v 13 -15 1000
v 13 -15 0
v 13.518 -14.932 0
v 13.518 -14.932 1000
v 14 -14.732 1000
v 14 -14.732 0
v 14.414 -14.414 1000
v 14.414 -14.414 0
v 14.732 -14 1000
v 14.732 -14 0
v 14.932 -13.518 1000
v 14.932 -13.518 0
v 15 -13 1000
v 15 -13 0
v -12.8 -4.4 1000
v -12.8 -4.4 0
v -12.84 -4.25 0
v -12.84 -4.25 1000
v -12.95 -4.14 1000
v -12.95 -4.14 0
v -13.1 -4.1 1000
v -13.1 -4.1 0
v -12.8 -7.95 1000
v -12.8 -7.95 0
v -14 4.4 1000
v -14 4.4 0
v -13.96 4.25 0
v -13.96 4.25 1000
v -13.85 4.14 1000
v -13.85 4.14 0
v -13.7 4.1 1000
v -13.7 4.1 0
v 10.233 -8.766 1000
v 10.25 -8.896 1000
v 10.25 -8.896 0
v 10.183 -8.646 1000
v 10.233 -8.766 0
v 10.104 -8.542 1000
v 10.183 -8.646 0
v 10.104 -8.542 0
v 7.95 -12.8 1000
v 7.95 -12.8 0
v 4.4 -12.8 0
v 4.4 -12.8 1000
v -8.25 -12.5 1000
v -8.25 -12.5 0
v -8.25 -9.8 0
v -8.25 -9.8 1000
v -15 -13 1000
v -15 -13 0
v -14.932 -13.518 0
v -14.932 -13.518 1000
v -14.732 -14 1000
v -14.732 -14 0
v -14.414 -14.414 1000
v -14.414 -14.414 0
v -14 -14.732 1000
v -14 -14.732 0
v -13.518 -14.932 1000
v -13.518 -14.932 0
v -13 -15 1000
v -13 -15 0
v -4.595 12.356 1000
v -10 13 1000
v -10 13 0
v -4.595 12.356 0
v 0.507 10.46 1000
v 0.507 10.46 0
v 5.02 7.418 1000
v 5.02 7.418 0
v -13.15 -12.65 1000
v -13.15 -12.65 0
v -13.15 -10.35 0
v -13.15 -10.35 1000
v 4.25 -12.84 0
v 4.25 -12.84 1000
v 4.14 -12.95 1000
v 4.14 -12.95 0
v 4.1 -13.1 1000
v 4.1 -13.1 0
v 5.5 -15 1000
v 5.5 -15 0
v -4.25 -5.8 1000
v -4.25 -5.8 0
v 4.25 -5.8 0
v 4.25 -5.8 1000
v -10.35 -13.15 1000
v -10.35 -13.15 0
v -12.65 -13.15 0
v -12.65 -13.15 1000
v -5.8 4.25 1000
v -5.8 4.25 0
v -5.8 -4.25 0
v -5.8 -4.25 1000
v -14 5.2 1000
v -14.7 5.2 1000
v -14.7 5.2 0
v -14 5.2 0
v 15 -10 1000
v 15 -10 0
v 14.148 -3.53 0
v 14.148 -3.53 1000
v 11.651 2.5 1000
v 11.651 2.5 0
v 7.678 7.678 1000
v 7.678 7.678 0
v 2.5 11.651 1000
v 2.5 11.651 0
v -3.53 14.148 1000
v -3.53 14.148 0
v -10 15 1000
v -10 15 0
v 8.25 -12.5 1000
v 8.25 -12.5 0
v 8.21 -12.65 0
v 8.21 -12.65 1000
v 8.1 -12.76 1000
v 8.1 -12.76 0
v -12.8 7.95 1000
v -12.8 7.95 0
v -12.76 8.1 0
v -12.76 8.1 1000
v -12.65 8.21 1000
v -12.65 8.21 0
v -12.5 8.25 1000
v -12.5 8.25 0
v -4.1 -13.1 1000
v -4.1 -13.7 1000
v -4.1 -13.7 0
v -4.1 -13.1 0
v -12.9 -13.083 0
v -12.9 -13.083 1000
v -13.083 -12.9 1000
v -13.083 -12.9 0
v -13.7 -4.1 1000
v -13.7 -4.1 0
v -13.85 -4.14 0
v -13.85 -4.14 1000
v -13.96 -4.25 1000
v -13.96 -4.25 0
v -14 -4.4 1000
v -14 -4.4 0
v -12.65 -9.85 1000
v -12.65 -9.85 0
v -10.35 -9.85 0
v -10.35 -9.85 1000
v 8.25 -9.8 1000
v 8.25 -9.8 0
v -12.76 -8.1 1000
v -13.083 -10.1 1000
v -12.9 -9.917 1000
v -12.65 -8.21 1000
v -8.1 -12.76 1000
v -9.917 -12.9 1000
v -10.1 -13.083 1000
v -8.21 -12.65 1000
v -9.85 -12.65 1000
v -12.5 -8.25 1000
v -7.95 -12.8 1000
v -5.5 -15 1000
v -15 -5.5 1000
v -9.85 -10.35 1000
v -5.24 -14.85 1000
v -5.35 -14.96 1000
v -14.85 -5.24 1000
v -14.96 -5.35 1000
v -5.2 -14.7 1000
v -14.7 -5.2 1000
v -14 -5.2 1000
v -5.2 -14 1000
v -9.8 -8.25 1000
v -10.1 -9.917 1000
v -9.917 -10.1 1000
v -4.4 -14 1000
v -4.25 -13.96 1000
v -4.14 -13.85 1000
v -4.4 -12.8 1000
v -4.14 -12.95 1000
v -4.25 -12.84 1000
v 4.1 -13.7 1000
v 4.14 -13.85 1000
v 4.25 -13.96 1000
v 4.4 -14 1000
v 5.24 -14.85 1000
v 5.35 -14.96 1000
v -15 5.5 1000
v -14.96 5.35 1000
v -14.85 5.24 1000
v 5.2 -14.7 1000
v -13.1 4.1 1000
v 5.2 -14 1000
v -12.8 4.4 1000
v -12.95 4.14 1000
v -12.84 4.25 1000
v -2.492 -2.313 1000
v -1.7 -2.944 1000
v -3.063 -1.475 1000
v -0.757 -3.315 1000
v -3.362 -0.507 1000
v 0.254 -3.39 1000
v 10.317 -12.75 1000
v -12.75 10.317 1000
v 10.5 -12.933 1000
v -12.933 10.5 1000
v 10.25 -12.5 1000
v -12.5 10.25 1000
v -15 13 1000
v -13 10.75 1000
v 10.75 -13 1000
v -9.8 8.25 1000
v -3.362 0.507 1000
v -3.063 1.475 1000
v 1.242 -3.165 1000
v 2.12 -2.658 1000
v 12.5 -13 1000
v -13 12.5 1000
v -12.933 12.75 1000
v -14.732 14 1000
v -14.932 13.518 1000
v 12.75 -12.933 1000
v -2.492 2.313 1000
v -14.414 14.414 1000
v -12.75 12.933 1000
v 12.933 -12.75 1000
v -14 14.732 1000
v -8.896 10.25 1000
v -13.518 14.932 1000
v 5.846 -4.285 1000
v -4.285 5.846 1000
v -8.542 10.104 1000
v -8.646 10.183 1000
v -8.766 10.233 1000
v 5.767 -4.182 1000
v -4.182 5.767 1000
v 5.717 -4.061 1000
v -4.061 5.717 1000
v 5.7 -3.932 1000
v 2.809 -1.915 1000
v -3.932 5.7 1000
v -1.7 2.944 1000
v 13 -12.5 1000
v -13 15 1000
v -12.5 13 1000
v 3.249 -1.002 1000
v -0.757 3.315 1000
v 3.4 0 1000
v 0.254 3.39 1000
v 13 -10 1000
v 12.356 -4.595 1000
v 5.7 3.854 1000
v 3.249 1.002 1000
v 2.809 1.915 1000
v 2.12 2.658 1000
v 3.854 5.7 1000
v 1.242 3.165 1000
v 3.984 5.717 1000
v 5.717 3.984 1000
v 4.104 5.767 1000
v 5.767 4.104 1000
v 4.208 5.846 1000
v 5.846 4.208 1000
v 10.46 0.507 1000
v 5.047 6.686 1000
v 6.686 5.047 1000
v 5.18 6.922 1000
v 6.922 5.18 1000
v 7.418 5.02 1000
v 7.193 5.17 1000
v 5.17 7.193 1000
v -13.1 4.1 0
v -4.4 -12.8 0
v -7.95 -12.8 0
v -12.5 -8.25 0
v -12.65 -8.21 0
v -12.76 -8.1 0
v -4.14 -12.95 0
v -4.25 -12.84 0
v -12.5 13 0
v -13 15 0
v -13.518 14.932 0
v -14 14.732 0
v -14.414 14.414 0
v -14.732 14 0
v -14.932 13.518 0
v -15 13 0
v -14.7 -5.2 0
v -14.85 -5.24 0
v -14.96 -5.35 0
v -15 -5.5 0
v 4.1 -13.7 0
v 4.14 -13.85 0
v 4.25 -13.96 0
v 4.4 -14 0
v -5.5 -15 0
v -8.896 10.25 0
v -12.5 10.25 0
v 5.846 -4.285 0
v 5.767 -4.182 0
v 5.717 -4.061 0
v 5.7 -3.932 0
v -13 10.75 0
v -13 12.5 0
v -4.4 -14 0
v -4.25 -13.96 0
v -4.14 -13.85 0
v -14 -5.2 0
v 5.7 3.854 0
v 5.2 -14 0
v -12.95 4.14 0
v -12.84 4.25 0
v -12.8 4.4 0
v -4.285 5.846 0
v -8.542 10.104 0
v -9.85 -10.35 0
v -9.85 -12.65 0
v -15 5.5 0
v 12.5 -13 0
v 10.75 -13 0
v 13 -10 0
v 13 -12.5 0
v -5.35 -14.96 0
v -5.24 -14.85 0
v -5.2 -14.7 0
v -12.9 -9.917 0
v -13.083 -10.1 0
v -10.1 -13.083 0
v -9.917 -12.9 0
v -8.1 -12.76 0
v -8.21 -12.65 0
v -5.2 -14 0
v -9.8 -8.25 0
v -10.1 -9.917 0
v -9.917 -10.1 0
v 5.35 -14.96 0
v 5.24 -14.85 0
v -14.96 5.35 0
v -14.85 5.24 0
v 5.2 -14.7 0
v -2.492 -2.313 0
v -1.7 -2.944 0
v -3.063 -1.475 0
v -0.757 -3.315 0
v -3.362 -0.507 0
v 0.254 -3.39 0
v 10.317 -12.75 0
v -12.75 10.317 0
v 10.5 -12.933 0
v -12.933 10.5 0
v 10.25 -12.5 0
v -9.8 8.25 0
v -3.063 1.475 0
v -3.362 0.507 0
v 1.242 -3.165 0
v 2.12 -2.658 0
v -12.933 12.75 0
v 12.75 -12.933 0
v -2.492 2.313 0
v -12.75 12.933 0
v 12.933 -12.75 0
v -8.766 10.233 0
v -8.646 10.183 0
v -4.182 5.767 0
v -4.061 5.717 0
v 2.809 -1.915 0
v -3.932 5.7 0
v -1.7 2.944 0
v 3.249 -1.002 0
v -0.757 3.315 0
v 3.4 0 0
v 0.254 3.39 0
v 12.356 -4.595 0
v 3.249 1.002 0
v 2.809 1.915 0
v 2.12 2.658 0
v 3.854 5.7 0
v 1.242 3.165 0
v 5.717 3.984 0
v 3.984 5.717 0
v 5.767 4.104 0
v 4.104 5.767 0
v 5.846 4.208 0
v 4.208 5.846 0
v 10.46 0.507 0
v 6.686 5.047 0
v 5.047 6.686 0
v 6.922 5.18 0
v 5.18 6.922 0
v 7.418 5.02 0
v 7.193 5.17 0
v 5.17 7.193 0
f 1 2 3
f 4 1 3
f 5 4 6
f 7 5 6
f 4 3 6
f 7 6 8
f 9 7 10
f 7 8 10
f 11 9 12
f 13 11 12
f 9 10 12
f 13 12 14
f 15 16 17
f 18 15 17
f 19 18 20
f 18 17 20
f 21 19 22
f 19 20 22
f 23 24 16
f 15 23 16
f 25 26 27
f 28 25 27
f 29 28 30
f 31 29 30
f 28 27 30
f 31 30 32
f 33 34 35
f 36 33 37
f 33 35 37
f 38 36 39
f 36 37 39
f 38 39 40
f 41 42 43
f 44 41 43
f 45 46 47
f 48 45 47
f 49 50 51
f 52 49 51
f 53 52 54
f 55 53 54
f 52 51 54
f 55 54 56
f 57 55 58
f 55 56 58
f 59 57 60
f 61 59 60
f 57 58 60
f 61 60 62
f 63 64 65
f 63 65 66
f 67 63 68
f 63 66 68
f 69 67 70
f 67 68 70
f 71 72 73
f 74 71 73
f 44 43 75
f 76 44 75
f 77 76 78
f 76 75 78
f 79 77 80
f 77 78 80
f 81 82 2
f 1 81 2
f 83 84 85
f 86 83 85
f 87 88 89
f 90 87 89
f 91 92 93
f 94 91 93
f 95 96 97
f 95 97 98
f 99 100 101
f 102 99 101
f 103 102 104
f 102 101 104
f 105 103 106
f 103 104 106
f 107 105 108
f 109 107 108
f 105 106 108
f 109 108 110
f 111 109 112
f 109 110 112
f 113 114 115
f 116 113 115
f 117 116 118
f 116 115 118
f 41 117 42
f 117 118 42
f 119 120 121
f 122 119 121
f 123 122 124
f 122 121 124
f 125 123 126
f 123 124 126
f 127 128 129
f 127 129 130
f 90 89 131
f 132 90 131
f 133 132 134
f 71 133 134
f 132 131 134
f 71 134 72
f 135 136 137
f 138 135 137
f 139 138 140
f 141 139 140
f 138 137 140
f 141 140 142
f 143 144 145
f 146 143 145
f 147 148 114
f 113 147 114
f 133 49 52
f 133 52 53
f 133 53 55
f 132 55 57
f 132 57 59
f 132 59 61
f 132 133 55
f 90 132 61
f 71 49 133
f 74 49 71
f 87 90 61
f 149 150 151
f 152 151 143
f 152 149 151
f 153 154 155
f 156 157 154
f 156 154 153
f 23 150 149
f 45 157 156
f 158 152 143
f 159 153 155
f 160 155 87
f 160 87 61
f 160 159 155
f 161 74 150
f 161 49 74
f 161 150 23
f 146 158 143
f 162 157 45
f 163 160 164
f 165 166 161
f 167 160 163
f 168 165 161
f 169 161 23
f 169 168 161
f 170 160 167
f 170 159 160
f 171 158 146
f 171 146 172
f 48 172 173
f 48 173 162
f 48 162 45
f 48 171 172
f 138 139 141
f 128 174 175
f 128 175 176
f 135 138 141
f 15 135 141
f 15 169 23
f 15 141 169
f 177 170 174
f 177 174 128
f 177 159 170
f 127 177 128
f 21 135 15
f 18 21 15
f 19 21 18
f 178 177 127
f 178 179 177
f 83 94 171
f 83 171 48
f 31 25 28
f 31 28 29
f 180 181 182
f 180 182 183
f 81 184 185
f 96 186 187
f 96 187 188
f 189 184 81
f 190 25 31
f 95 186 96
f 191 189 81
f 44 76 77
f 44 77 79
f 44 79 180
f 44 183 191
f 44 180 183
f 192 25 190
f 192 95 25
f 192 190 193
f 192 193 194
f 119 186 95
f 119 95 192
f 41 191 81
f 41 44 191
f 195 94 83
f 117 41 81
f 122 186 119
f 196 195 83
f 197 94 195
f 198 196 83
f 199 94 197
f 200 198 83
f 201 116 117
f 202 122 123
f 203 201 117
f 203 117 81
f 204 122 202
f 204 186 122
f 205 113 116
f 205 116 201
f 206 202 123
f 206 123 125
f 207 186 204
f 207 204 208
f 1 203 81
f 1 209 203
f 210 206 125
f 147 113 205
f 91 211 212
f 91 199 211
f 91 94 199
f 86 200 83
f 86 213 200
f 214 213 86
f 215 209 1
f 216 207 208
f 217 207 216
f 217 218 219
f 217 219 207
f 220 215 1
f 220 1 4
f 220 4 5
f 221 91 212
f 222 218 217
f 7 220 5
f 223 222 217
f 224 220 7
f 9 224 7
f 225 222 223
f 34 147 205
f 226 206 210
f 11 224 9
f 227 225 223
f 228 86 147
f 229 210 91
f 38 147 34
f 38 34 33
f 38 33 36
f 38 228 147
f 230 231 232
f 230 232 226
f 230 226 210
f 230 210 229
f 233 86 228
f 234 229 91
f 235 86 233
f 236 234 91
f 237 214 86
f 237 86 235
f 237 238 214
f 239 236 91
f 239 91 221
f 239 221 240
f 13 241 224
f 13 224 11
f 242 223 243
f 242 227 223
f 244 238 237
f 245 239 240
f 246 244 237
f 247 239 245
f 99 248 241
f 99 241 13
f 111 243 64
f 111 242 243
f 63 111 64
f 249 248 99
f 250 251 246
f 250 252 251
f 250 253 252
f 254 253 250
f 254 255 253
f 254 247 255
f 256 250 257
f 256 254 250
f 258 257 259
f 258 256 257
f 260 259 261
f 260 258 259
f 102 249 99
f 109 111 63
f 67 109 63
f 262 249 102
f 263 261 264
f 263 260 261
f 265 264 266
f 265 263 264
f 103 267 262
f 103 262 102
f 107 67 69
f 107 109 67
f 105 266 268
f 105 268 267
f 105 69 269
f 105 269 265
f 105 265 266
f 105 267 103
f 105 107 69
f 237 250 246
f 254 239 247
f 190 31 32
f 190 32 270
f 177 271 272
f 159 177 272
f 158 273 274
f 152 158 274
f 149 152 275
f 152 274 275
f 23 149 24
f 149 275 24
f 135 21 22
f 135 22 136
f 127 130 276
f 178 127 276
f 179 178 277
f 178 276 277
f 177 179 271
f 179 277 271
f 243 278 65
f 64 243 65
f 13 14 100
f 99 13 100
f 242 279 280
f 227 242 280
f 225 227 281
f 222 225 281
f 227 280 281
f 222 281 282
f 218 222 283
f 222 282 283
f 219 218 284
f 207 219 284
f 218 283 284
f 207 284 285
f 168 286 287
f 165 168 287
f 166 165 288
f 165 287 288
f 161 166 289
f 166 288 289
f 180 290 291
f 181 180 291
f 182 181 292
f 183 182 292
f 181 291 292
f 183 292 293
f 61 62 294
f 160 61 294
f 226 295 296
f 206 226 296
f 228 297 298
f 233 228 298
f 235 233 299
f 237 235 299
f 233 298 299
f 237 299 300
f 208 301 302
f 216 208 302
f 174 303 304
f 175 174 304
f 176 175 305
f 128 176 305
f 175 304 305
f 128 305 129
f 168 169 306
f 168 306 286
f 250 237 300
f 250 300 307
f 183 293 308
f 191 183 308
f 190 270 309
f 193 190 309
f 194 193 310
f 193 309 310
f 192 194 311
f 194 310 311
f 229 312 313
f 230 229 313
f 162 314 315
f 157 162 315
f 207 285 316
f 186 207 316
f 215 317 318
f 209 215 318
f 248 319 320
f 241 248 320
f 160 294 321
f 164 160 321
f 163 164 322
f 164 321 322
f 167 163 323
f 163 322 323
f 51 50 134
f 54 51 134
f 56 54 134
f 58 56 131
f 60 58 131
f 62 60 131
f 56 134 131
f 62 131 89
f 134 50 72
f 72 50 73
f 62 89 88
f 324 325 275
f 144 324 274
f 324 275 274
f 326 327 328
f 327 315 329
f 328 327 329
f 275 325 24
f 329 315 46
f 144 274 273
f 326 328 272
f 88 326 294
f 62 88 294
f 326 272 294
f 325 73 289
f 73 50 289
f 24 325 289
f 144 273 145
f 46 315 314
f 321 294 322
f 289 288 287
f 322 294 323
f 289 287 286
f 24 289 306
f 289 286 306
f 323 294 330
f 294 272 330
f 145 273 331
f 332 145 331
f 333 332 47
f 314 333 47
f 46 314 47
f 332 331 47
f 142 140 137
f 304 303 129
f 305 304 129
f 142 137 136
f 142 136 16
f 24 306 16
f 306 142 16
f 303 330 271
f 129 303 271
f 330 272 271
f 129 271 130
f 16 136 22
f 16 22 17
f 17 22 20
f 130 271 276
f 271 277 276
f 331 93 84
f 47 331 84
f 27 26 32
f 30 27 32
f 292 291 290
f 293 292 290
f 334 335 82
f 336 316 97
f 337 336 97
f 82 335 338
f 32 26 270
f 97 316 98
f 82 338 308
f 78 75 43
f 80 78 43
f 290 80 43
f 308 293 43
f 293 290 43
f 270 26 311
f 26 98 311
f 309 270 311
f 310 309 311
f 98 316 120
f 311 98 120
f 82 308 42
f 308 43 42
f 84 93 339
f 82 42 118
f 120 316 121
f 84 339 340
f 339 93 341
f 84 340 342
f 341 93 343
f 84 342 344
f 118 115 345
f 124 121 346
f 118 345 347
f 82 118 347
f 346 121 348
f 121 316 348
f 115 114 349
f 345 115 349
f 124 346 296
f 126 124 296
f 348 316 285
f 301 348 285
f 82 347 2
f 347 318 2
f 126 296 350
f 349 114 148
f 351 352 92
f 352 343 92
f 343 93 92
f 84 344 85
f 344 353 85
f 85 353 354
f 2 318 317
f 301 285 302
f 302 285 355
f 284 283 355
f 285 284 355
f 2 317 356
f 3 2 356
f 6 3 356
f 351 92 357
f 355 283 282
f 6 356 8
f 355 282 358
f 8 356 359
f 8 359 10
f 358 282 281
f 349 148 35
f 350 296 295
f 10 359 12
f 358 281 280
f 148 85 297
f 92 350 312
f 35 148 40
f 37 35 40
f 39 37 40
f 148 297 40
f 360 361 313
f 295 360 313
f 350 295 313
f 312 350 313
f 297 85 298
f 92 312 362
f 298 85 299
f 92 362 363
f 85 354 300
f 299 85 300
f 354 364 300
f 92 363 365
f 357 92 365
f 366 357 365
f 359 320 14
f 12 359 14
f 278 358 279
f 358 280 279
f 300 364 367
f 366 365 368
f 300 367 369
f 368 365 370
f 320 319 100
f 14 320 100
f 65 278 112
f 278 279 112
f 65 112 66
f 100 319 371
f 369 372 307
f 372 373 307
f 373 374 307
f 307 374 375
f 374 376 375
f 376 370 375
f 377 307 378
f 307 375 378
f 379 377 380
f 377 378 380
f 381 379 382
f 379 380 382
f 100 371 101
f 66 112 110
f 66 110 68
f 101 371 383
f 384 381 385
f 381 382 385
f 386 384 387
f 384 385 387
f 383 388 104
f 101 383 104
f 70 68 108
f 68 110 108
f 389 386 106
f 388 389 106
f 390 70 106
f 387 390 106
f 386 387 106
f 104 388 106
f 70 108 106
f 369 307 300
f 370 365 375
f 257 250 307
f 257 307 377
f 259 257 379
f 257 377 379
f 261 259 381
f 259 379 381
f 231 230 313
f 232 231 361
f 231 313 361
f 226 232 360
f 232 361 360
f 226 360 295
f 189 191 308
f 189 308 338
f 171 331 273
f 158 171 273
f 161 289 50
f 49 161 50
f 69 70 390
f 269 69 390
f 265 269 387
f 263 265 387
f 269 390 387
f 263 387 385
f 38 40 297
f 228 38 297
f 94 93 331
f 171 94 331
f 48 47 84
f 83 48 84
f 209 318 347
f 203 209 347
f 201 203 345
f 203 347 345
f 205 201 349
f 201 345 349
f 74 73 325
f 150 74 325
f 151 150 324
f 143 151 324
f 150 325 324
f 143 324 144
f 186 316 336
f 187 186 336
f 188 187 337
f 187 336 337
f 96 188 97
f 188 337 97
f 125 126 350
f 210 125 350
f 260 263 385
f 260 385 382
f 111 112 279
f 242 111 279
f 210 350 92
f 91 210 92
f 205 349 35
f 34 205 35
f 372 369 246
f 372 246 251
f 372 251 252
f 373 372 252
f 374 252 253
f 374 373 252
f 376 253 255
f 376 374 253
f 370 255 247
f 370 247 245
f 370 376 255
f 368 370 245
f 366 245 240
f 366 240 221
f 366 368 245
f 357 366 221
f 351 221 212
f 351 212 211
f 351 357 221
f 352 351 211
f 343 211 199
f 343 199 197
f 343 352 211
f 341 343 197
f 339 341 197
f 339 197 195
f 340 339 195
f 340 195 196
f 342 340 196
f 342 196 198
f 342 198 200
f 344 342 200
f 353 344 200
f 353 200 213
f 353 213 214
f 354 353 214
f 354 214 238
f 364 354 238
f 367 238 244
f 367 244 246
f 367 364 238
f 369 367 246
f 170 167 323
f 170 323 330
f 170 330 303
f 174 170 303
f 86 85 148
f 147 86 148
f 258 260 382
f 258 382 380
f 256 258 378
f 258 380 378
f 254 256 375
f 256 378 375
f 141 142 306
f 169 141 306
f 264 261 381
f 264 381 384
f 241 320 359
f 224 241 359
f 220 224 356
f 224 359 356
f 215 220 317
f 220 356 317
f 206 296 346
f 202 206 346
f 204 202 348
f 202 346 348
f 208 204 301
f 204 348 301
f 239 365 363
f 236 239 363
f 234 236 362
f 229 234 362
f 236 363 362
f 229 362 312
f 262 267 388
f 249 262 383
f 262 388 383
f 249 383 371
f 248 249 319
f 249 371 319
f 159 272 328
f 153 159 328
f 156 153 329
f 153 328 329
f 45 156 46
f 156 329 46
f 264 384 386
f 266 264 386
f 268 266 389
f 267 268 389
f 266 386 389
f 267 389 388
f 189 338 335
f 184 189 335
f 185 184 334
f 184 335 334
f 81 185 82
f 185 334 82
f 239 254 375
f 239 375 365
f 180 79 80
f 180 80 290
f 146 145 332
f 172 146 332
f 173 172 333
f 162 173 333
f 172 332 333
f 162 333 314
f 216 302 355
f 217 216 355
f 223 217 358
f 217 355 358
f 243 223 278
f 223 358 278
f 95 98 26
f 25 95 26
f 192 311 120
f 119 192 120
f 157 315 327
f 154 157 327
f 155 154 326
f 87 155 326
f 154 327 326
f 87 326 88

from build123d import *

# Parameters (mm, degrees)
SKETCH_1_R      = 3.4
EXTRUDE_1_DEPTH = 1000


with BuildPart() as part:
    # Эскиз1 → Бобышка-Вытянуть1 (new body)
    with BuildSketch(Plane.XY):
        with BuildLine():
            Line((-15, -5.5), (-15, -8.25))
            Line((-15, -8.25), (-15, -13))
            ThreePointArc((-15, -13), (-14.414213562, -14.414213562), (-13, -15))
            Line((-13, -15), (-8.25, -15))
            Line((-8.25, -15), (-5.5, -15))
            ThreePointArc((-5.5, -15), (-5.287867966, -14.912132034), (-5.2, -14.7))
            Line((-5.2, -14.7), (-5.2, -14))
            Line((-5.2, -14), (-4.4, -14))
            ThreePointArc((-4.4, -14), (-4.187867966, -13.912132034), (-4.1, -13.7))
            Line((-4.1, -13.7), (-4.1, -13.1))
            ThreePointArc((-4.1, -13.1), (-4.187867966, -12.887867966), (-4.4, -12.8))
            Line((-4.4, -12.8), (-7.95, -12.8))
            ThreePointArc((-7.95, -12.8), (-8.162132034, -12.712132034), (-8.25, -12.5))
            Line((-8.25, -12.5), (-8.25, -9.8))
            Line((-8.25, -9.8), (-4.25, -5.8))
            Line((-4.25, -5.8), (4.25, -5.8))
            Line((4.25, -5.8), (8.25, -9.8))
            Line((8.25, -9.8), (8.25, -12.5))
            ThreePointArc((8.25, -12.5), (8.162132034, -12.712132034), (7.95, -12.8))
            Line((7.95, -12.8), (4.4, -12.8))
            ThreePointArc((4.4, -12.8), (4.187867966, -12.887867966), (4.1, -13.1))
            Line((4.1, -13.1), (4.1, -13.7))
            ThreePointArc((4.1, -13.7), (4.187867966, -13.912132034), (4.4, -14))
            Line((4.4, -14), (5.2, -14))
            Line((5.2, -14), (5.2, -14.7))
            ThreePointArc((5.2, -14.7), (5.287867966, -14.912132034), (5.5, -15))
            Line((5.5, -15), (8.25, -15))
            Line((8.25, -15), (13, -15))
            ThreePointArc((13, -15), (14.414213562, -14.414213562), (15, -13))
            Line((15, -13), (15, -10))
            ThreePointArc((15, -10), (7.67766953, 7.67766953), (-10, 15))
            Line((-10, 15), (-13, 15))
            ThreePointArc((-13, 15), (-14.414213562, 14.414213562), (-15, 13))
            Line((-15, 13), (-15, 8.25))
            Line((-15, 8.25), (-15, 5.5))
            ThreePointArc((-15, 5.5), (-14.912132034, 5.287867966), (-14.7, 5.2))
            Line((-14.7, 5.2), (-14, 5.2))
            Line((-14, 5.2), (-14, 4.4))
            ThreePointArc((-14, 4.4), (-13.912132034, 4.187867966), (-13.7, 4.1))
            Line((-13.7, 4.1), (-13.1, 4.1))
            ThreePointArc((-13.1, 4.1), (-12.887867966, 4.187867966), (-12.8, 4.4))
            Line((-12.8, 4.4), (-12.8, 7.95))
            ThreePointArc((-12.8, 7.95), (-12.712132034, 8.162132034), (-12.5, 8.25))
            Line((-12.5, 8.25), (-9.8, 8.25))
            Line((-9.8, 8.25), (-5.8, 4.25))
            Line((-5.8, 4.25), (-5.8, -4.25))
            Line((-5.8, -4.25), (-9.8, -8.25))
            Line((-9.8, -8.25), (-12.5, -8.25))
            ThreePointArc((-12.5, -8.25), (-12.712132034, -8.162132034), (-12.8, -7.95))
            Line((-12.8, -7.95), (-12.8, -4.4))
            ThreePointArc((-12.8, -4.4), (-12.887867966, -4.187867966), (-13.1, -4.1))
            Line((-13.1, -4.1), (-13.7, -4.1))
            ThreePointArc((-13.7, -4.1), (-13.912132034, -4.187867966), (-14, -4.4))
            Line((-14, -4.4), (-14, -5.2))
            Line((-14, -5.2), (-14.7, -5.2))
            ThreePointArc((-14.7, -5.2), (-14.912132034, -5.287867966), (-15, -5.5))
        make_face()
        with BuildLine():
            ThreePointArc((-13.15, -10.35), (-13.003553391, -9.996446609), (-12.65, -9.85))
            Line((-12.65, -9.85), (-10.35, -9.85))
            ThreePointArc((-10.35, -9.85), (-9.996446609, -9.996446609), (-9.85, -10.35))
            Line((-9.85, -10.35), (-9.85, -12.65))
            ThreePointArc((-9.85, -12.65), (-9.996446609, -13.003553391), (-10.35, -13.15))
            Line((-10.35, -13.15), (-12.65, -13.15))
            ThreePointArc((-12.65, -13.15), (-13.003553391, -13.003553391), (-13.15, -12.65))
            Line((-13.15, -12.65), (-13.15, -10.35))
        make_face(mode=Mode.SUBTRACT)
        Circle(SKETCH_1_R, mode=Mode.SUBTRACT)
        with BuildLine():
            Line((13, -10), (13, -12.5))
            ThreePointArc((13, -12.5), (12.853553391, -12.853553391), (12.5, -13))
            Line((12.5, -13), (10.75, -13))
            ThreePointArc((10.75, -13), (10.396446609, -12.853553391), (10.25, -12.5))
            Line((10.25, -12.5), (10.25, -8.895836944))
            ThreePointArc((10.25, -8.895836944), (10.211939766, -8.704495228), (10.103553391, -8.542283553))
            Line((10.103553391, -8.542283553), (5.846446609, -4.285176772))
            ThreePointArc((5.846446609, -4.285176772), (5.738060234, -4.122965098), (5.7, -3.931623382))
            Line((5.7, -3.931623382), (5.7, 3.854163056))
            ThreePointArc((5.7, 3.854163056), (5.738060234, 4.045504772), (5.846446609, 4.207716447))
            Line((5.846446609, 4.207716447), (6.685973486, 5.047243323))
            ThreePointArc((6.685973486, 5.047243323), (7.057970063, 5.193349665), (7.418183029, 5.020216375))
            ThreePointArc((7.418183029, 5.020216375), (11.559431923, -1.988077936), (13, -10))
        make_face(mode=Mode.SUBTRACT)
        with BuildLine():
            Line((-13, 10.75), (-13, 12.5))
            ThreePointArc((-13, 12.5), (-12.853553391, 12.853553391), (-12.5, 13))
            Line((-12.5, 13), (-10, 13))
            ThreePointArc((-10, 13), (-1.988077936, 11.559431923), (5.020216375, 7.418183029))
            ThreePointArc((5.020216375, 7.418183029), (5.193349665, 7.057970063), (5.047243323, 6.685973486))
            Line((5.047243323, 6.685973486), (4.207716447, 5.846446609))
            ThreePointArc((4.207716447, 5.846446609), (4.045504772, 5.738060234), (3.854163056, 5.7))
            Line((3.854163056, 5.7), (-3.931623382, 5.7))
            ThreePointArc((-3.931623382, 5.7), (-4.122965098, 5.738060234), (-4.285176772, 5.846446609))
            Line((-4.285176772, 5.846446609), (-8.542283553, 10.103553391))
            ThreePointArc((-8.542283553, 10.103553391), (-8.704495228, 10.211939766), (-8.895836944, 10.25))
            Line((-8.895836944, 10.25), (-12.5, 10.25))
            ThreePointArc((-12.5, 10.25), (-12.853553391, 10.396446609), (-13, 10.75))
        make_face(mode=Mode.SUBTRACT)
    extrude(amount=EXTRUDE_1_DEPTH)


solid = part.part
